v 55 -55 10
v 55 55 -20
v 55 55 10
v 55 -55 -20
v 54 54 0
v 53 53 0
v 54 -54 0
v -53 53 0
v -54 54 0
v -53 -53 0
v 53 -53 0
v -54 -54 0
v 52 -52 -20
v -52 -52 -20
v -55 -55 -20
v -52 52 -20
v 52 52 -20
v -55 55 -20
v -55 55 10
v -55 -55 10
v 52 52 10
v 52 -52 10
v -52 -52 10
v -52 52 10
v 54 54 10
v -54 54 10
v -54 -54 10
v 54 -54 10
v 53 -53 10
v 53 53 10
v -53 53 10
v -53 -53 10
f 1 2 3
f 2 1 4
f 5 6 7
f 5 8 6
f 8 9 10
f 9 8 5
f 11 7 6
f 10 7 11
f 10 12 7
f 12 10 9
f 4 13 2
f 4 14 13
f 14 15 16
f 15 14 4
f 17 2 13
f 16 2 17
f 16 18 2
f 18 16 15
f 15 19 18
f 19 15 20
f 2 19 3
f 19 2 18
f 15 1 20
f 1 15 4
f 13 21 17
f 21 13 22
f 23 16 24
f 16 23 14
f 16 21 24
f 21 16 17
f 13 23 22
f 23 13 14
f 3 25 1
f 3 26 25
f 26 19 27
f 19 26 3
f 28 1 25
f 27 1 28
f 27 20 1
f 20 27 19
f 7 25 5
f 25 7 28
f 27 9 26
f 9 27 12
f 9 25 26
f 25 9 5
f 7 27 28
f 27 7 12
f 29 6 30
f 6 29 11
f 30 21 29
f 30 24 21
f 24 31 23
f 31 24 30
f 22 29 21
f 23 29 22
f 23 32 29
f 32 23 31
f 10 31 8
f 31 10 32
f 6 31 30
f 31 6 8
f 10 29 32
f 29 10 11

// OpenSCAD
// Custom Wiper Box by Matt Johnson
// intentional3D
// Use this to customize your own nozzle wiper for multi extruding printers.


//


width = 110;
depth = 110;
height = 10;
wallThickness = 1;
gap=1;
base=10;






gapThickness = gap+1;


base();


module base() 
    {
        union() 
        {
                 //base
                difference()
                { 
                    translate([-(width)/2, -(depth)/2, -height-base]) 
                    {
                
                        cube([width,depth,height+base]);
                    }
                
        
                translate([(width-2*gapThickness-2*wallThickness)/-2,(depth-2*gapThickness-2*wallThickness)/-2,-50]) 
                    {
                        cube([(width-2*gapThickness-2*wallThickness),(depth-2*gapThickness-2*wallThickness),100]);
                    }
     
                }
            // Outer Wall
            difference()
            {
                translate([-width/2, -depth/2, 0]) 
                {
                    cube([width,depth,height]);
                }
	
                translate([(-width/2) + wallThickness, -depth/2 + wallThickness, -50]) 
                {
                    cube([width - (wallThickness * 2), depth - (wallThickness * 2), 100]);
                }
                                
            }
            // inner wall
                difference()
                { 
                    translate([-(width-2*gapThickness)/2, -(depth-2*gapThickness)/2, 0]) 
                    {
                
                        cube([width-2*gapThickness,depth-2*gapThickness,height]);
                    }
                
        
                translate([(width-2*gapThickness-2*wallThickness)/-2,(depth-2*gapThickness-2*wallThickness)/-2,-height]) 
                    {
                        cube([(width-2*gapThickness-2*wallThickness),(depth-2*gapThickness-2*wallThickness),100]);
                    }
     
                }
           
                
            }
        }
